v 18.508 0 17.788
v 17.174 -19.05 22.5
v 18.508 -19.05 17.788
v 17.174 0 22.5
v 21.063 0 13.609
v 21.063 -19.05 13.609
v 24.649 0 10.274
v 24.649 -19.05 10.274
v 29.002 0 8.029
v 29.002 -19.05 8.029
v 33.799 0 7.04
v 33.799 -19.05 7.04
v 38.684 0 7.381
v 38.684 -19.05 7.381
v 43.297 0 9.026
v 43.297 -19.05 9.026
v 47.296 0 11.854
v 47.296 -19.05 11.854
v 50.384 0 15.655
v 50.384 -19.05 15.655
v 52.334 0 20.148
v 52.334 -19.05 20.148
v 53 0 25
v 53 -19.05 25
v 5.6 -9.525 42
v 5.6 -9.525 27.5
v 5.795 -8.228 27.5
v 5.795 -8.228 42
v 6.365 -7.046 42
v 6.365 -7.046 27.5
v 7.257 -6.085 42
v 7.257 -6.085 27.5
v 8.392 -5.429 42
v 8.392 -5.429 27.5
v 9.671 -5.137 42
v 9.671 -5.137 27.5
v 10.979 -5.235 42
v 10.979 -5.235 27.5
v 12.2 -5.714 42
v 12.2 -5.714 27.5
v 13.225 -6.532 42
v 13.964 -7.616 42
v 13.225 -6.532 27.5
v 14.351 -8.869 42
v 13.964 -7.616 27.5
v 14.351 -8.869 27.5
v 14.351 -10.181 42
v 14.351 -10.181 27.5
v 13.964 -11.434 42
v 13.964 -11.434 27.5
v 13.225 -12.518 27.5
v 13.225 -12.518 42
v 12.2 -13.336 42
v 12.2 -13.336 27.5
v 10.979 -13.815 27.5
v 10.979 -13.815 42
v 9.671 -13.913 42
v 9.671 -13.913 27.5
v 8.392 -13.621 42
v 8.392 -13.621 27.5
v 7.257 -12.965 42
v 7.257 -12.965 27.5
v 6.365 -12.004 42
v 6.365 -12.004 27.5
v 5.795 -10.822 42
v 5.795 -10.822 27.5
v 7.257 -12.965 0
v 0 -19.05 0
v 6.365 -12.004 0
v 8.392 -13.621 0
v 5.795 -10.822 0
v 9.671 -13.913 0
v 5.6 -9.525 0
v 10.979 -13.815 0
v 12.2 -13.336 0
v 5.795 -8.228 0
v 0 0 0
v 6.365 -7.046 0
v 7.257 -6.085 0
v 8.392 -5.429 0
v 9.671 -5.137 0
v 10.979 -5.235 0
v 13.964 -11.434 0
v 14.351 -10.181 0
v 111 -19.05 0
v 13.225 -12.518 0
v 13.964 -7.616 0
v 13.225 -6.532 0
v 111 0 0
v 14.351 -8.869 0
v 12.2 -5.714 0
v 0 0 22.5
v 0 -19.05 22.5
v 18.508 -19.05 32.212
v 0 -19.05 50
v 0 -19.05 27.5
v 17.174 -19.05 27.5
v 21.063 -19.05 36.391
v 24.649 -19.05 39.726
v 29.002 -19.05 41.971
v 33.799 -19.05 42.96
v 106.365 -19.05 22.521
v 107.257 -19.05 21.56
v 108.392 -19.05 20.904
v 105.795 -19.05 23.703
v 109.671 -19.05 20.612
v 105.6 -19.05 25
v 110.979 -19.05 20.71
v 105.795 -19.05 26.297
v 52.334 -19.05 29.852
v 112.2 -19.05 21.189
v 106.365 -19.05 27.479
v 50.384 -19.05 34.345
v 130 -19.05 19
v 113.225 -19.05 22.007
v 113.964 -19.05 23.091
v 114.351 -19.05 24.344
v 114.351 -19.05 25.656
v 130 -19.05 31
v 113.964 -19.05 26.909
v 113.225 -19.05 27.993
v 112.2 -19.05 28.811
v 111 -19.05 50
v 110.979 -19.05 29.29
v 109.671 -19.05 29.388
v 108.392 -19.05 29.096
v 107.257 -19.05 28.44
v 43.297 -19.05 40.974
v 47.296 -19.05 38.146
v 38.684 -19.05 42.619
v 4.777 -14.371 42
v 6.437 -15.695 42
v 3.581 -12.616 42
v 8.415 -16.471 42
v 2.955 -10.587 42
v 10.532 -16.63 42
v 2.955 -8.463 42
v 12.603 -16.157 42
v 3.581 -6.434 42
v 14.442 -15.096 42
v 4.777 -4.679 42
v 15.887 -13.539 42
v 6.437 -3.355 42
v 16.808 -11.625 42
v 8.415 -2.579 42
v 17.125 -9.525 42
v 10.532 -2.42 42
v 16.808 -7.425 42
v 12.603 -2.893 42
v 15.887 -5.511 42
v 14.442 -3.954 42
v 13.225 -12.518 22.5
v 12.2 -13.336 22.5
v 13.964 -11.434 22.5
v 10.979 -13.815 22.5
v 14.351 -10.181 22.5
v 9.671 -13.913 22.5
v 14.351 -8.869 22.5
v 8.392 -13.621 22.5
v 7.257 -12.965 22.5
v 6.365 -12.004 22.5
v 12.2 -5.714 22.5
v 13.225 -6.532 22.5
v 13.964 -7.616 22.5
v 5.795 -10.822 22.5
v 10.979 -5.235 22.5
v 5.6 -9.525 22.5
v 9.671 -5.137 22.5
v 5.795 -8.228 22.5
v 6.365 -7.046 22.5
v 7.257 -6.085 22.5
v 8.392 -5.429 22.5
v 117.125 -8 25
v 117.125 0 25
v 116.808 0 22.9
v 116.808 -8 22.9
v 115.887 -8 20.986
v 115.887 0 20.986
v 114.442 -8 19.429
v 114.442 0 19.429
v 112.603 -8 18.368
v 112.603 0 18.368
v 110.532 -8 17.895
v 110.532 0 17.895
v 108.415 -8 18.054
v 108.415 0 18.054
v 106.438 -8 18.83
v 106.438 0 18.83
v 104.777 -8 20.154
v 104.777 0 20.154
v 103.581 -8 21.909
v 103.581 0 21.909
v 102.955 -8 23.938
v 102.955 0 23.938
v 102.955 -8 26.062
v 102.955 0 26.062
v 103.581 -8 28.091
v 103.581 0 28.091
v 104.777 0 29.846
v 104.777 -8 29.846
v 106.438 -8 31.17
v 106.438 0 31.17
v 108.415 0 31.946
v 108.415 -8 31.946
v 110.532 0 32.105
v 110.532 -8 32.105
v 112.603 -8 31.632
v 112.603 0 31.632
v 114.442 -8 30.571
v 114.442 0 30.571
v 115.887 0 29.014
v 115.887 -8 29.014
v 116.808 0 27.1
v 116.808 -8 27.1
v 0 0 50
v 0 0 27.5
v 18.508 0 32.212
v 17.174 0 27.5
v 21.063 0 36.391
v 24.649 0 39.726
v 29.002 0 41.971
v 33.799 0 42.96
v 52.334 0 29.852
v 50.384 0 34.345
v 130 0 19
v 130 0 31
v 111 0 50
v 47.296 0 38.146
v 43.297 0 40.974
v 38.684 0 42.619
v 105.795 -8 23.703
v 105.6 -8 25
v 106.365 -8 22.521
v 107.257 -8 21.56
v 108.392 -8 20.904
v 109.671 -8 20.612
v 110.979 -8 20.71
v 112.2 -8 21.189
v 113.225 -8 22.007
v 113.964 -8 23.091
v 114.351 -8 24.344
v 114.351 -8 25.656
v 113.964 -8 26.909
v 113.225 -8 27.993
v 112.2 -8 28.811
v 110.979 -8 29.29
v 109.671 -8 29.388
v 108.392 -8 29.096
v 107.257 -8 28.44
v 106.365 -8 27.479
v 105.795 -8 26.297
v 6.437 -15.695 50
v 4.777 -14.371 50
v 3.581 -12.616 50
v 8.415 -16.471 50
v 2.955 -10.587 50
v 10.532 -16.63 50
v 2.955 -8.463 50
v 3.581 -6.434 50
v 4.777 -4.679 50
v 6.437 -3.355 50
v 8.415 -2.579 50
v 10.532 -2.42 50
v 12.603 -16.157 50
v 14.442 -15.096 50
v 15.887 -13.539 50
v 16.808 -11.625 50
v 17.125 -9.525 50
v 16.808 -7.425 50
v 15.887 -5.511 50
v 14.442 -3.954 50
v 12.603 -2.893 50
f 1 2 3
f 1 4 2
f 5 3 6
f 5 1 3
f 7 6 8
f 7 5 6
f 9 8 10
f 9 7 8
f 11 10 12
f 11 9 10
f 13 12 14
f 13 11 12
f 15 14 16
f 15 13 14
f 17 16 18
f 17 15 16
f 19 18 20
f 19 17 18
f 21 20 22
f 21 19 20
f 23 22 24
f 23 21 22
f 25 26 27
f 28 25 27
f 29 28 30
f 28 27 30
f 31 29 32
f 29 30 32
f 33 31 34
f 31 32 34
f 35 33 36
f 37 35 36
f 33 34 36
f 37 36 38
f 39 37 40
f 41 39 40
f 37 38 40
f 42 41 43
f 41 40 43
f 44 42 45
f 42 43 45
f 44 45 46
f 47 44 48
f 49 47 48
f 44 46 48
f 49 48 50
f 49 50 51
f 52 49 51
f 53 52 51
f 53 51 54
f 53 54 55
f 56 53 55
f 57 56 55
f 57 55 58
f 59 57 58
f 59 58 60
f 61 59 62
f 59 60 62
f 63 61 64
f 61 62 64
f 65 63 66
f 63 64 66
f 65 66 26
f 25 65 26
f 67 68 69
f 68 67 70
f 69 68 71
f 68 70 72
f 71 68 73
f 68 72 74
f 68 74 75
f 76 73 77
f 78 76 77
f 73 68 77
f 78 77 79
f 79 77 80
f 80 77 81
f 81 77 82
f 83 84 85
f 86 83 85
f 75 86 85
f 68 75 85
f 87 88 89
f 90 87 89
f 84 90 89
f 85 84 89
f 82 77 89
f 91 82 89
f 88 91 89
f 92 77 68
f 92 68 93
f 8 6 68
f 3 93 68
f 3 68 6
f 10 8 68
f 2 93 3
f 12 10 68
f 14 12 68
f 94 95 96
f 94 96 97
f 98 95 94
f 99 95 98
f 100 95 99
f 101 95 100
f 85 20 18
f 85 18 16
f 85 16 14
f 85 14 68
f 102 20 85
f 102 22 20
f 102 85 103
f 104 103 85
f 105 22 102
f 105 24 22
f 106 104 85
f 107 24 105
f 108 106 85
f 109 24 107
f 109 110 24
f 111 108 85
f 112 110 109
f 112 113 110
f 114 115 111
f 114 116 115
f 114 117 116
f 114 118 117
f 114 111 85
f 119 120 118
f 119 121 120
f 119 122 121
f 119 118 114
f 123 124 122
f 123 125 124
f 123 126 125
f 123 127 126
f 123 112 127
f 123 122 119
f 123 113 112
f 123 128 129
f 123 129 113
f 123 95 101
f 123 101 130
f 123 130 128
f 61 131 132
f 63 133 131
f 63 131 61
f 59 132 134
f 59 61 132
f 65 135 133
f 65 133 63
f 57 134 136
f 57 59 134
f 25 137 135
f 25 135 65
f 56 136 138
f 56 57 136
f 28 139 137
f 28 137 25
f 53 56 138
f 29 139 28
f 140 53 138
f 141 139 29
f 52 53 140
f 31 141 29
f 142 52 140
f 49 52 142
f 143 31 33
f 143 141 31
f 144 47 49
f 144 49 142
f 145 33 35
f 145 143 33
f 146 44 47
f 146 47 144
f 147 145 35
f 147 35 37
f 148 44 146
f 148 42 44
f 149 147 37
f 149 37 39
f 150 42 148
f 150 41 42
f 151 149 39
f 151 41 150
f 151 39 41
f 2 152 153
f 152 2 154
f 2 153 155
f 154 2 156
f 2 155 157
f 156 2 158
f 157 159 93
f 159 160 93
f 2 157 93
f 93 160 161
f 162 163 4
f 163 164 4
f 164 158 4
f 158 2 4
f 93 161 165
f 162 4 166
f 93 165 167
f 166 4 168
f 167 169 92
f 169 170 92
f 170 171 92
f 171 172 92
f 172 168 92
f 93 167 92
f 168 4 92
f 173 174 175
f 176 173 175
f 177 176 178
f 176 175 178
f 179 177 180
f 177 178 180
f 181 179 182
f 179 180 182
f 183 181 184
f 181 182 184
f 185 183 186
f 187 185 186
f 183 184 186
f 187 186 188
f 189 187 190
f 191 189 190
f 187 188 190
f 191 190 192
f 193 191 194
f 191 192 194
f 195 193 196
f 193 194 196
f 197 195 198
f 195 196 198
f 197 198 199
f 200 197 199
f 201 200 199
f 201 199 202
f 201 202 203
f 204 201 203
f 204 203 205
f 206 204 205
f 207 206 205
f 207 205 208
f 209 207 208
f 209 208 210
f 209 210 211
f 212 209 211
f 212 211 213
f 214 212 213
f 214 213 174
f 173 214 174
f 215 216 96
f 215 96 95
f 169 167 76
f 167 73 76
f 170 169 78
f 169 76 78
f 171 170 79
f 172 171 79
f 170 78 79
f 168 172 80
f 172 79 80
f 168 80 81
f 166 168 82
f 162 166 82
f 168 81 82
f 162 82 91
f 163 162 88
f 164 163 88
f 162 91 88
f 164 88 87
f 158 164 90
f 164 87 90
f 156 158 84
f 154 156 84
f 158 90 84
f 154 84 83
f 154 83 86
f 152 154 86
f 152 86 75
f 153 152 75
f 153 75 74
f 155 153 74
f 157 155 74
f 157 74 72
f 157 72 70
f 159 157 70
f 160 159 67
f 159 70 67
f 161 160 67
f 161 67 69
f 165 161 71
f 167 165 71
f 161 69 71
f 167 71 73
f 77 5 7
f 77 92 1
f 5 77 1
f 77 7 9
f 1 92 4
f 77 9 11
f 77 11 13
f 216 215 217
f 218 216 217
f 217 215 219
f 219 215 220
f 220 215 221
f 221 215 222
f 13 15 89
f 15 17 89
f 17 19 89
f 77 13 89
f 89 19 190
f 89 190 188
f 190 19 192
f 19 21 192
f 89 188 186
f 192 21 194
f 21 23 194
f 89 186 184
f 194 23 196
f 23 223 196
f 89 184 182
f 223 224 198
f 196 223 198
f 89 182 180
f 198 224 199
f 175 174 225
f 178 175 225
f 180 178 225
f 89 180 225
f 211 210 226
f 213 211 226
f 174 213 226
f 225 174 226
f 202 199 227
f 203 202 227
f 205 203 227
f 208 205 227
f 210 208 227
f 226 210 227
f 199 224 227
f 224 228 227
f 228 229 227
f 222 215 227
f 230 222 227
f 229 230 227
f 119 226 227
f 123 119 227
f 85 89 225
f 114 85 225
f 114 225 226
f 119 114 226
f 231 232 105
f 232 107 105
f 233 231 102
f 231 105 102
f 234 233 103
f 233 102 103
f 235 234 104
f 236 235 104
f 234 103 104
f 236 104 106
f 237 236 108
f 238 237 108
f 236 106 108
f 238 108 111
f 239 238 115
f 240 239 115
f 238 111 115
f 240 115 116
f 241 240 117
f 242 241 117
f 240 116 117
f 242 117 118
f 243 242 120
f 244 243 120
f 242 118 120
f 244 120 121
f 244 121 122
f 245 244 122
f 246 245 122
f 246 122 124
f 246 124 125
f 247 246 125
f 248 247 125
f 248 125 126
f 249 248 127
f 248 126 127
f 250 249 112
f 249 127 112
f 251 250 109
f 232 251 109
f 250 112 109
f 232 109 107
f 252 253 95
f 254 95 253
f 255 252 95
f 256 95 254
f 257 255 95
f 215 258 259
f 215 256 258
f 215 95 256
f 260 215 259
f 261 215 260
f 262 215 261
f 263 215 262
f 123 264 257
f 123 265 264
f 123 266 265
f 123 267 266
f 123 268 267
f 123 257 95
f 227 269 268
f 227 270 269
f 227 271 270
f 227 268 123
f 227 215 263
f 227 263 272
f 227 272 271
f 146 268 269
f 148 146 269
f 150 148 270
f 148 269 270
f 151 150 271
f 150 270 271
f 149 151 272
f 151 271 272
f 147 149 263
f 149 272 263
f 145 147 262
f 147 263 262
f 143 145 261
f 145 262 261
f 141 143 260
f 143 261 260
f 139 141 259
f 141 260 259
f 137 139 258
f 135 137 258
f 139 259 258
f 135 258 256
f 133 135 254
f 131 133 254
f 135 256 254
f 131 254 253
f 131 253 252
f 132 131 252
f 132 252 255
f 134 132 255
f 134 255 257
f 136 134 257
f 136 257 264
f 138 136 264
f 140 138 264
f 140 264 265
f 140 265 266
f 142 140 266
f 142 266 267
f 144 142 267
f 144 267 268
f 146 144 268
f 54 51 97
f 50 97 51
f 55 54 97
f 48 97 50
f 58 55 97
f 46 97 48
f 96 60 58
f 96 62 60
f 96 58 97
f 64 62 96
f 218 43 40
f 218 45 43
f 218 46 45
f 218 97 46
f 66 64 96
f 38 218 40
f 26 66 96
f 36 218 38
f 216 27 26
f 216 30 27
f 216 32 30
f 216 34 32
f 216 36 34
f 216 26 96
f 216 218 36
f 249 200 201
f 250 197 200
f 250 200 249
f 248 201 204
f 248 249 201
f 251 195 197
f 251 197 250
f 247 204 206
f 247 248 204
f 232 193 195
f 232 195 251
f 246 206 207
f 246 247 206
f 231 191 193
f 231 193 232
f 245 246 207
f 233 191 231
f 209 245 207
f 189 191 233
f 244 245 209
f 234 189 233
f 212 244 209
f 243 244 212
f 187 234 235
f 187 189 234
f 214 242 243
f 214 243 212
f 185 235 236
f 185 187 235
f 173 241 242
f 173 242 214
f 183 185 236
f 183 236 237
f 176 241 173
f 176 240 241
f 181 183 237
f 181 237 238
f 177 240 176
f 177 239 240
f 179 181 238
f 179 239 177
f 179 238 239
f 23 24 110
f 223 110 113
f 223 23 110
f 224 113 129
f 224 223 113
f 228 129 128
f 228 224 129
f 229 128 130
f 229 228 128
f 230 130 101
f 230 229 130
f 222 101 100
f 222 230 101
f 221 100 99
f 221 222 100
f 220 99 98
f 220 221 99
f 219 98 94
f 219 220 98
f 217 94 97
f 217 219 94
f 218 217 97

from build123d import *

# Parameters (mm, degrees)
F0_W           = 130
F0_H           = 50
F1_DEPTH       = 19.05
F2_R           = 18
F3_DEPTH       = 40
F4_D           = 8.8
F4_CBORE_D     = 14.25
F4_CBORE_DEPTH = 8
F6_D           = 8.8
F6_CBORE_D     = 14.25
F6_CBORE_DEPTH = 8
F7_W           = 21.662
F7_H           = 5
F8_DEPTH       = 40
F10_DEPTH      = 25


with BuildPart() as f1:
    # F0 (on Front) → F1 (new body)
    with BuildSketch(Plane.XZ):
        with Locations((65, 25)):
            Rectangle(F0_W, F0_H)
    extrude(amount=F1_DEPTH)

    # F2 (on Front) → F3 (cut)
    with BuildSketch(Plane.XZ):
        with Locations((35, 25)):
            Circle(F2_R)
    extrude(amount=F3_DEPTH, mode=Mode.SUBTRACT)

    # F4 (through all)
    with Locations(Plane(origin=(0, 0, 0), x_dir=(1, 0, 0), z_dir=(0, 1, 0))):
        with Locations((110, -25)):
            CounterBoreHole(F4_D / 2, F4_CBORE_D / 2, F4_CBORE_DEPTH)

    # F6 (through all)
    with Locations(Plane.XY.offset(50)):
        with Locations((10, -9.525)):
            CounterBoreHole(F6_D / 2, F6_CBORE_D / 2, F6_CBORE_DEPTH)

    # F7 (on face) → F8 (cut)
    with BuildSketch(Plane(origin=(0, 0, 0), x_dir=(-1, 0, 0), z_dir=(0, 1, 0))):
        with Locations((-10.831, 25)):
            Rectangle(F7_W, F7_H)
    extrude(amount=-F8_DEPTH, mode=Mode.SUBTRACT)

    # F9 (on face) → F10 (cut)
    with BuildSketch(Plane(origin=(0, 0, 0), x_dir=(-1, 0, 0), z_dir=(0, 1, 0))):
        Polygon((-130, 19), (-130, 0), (-111, 0), align=None)
        Polygon((-130, 50), (-130, 31), (-111, 50), align=None)
    extrude(amount=-F10_DEPTH, mode=Mode.SUBTRACT)


solid = f1.part
